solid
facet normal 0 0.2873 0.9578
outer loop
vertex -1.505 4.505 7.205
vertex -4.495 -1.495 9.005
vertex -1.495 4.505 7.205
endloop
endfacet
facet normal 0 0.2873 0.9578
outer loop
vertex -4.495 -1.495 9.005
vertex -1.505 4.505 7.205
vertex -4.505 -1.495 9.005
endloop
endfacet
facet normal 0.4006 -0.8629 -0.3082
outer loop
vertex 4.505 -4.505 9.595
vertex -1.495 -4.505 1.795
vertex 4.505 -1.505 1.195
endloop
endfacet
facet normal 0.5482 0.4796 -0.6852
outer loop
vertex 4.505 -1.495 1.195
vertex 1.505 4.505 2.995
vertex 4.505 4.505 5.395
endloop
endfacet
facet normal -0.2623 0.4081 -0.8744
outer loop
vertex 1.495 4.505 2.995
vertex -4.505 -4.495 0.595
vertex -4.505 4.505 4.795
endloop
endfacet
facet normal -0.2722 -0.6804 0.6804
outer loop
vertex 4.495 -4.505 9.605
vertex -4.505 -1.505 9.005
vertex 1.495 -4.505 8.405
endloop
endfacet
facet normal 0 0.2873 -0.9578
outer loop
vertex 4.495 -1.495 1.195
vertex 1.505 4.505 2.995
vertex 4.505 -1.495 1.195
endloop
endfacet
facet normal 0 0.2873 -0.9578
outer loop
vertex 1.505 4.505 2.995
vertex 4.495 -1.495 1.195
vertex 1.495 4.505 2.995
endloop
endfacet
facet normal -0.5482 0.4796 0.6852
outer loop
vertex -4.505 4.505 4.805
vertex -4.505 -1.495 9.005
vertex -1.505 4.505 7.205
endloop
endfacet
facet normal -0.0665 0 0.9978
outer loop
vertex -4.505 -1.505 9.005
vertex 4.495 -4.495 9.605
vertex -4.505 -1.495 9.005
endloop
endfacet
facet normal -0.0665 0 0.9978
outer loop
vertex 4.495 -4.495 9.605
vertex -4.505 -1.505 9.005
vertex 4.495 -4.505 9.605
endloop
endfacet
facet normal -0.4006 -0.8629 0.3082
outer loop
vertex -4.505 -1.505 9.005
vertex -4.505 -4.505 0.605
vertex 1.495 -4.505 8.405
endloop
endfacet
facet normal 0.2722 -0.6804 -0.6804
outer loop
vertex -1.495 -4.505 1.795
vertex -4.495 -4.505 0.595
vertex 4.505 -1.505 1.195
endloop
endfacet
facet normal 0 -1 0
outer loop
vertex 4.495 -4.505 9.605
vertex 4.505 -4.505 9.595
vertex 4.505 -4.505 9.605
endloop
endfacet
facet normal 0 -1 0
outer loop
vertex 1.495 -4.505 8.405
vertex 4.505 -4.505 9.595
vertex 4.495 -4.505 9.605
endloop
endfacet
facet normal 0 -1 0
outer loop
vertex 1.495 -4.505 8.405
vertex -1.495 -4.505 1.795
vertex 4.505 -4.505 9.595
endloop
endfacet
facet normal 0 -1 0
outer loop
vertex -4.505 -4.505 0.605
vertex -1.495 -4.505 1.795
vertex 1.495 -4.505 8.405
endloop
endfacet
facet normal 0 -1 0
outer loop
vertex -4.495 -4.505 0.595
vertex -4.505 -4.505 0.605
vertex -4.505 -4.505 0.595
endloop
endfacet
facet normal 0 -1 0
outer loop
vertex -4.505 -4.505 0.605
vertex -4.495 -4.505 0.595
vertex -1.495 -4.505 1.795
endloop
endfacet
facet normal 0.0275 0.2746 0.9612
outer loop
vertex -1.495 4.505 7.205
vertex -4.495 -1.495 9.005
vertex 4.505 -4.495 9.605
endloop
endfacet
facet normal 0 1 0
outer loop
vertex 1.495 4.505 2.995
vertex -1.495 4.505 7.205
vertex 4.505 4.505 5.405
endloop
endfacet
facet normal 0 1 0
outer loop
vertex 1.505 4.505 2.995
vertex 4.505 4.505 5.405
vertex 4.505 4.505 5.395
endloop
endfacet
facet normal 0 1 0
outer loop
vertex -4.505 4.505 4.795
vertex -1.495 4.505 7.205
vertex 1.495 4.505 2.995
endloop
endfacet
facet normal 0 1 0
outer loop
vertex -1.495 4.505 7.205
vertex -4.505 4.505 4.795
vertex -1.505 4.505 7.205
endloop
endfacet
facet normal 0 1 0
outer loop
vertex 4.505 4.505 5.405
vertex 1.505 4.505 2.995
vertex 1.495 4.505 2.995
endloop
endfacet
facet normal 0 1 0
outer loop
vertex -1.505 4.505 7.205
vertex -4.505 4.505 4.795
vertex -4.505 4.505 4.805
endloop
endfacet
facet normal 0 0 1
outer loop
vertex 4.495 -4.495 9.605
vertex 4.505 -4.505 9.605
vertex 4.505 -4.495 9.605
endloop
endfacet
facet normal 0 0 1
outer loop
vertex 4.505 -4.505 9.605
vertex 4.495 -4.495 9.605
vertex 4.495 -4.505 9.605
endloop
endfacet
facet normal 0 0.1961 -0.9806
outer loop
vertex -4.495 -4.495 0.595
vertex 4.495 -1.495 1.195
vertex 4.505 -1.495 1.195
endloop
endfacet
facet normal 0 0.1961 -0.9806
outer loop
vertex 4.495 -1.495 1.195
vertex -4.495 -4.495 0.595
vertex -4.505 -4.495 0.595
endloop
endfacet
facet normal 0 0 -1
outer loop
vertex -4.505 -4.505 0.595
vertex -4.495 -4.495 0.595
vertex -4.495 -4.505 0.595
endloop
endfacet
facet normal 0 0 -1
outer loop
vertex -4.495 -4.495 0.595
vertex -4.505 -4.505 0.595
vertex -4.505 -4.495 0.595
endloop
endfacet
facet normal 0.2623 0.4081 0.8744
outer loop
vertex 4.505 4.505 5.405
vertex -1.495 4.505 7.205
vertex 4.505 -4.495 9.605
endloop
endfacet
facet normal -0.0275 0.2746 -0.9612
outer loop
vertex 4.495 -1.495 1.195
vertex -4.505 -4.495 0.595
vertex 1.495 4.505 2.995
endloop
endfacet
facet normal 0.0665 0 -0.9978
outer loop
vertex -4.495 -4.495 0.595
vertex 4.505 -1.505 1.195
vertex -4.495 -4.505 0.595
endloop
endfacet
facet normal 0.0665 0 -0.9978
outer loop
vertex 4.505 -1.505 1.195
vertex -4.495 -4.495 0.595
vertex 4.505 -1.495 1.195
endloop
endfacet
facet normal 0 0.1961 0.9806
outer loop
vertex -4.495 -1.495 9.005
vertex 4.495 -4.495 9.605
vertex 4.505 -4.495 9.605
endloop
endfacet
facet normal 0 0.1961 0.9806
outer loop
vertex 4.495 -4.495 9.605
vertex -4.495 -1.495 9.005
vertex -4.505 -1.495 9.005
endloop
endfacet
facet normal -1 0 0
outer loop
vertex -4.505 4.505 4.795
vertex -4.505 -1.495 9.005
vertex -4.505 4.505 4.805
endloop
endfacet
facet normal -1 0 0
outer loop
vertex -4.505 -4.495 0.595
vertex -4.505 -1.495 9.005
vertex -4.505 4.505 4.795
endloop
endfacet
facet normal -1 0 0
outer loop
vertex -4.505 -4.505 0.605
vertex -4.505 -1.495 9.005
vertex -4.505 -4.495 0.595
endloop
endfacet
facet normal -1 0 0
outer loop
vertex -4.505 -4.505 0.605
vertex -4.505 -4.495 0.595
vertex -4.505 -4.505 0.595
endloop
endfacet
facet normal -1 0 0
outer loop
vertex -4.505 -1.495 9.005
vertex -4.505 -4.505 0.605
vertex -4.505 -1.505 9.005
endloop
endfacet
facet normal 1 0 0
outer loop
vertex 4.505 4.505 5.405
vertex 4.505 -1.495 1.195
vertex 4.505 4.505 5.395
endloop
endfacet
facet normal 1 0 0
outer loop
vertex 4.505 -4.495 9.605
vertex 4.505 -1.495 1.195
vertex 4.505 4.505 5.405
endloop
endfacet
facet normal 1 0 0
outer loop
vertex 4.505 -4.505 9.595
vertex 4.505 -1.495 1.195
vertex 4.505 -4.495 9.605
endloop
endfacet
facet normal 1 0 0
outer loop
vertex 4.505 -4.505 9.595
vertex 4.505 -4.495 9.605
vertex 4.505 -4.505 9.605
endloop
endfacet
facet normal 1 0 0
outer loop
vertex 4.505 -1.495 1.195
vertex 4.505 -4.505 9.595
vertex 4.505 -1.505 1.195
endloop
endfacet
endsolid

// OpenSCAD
// Magic Gem Generator
// Based on the R³ embedding approach described in "Complete Analysis Pipeline for Magic Squares"
// This script converts magic squares into 3D geometric representations

// Define parameters
$fn = 5; // Reduced resolution for faster rendering
point_size = 0.5; // Size of points in the embedding
edge_size = 0.01; // Size of hull vertices
cylinder_size = 0.25; // Size of connecting cylinders
hull_opacity = 0.3; // Opacity of the convex hull faces
show_points = false; // Whether to show the embedded points
show_hull = true; // Whether to show the convex hull
show_edges = false; // Whether to show connecting edges
show_radial_edges = false; // Whether to show radial edges from center to each point
scale_factor = 3; // Scale factor for the embedding
vertical_scale = 0.2; // Vertical scale factor to flatten the shape

// Define magic squares
magic_squares = [
     // 8 vertices, 4 face points, 4 interior points
    [
        [1, 6, 11, 16],
        [14, 12, 5, 3],
        [15, 9, 8, 2],
        [4, 7, 10, 13]
    ],
    // 9 vertices, 3 face points, 4 interior points
    [
        [1, 5, 16, 12],
        [15, 14, 3, 2],
        [10, 11, 6, 7],
        [8, 4, 9, 13]
    ],
    // 10 vertices, 2 face points, 4 interior points
    [
        [1, 3, 14, 16],
        [15, 13, 4, 2],
        [10, 6, 11, 7],
        [8, 12, 5, 9]
    ],
    // // 10 vertices, 3 face points, 3 interior points
    [
        [1, 4, 16, 13],
        [14, 15, 3, 2],
        [11, 10, 6, 7],
        [8, 5, 9, 12]
    ],
    // 10 vertices, 4 face points, 2 interior points
    [
        [1, 4, 13, 16],
        [15, 14, 3, 2],
        [8, 5, 12, 9],
        [10, 11, 6, 7]
    ],
    // 10 vertices, 6 face points, 0 interior points
    [
        [1, 4, 13, 16],
        [8, 14, 3, 9],
        [15, 5, 12, 2],
        [10, 11, 6, 7]
    ],
    // 11 vertices, 1 face points, 4 interior points
    [
        [1, 4, 14, 15],
        [16, 13, 3, 2],
        [11, 10, 8, 5],
        [6, 7, 9, 12]
    ],
    // 11 vertices, 2 face points, 3 interior points
    [
        [1, 4, 14, 15],
        [16, 13, 3, 2],
        [7, 6, 12, 9],
        [10, 11, 5, 8]
    ],
    // 11 vertices, 3 face points, 2 interior points
    [
        [1, 6, 15, 12],
        [16, 11, 2, 5],
        [4, 7, 14, 9],
        [13, 10, 3, 8]
    ],
    // 12 vertices, 0 face points, 4 interior points
    [
        [1, 3, 14, 16],
        [10, 13, 4, 7],
        [15, 6, 11, 2],
        [8, 12, 5, 9]
    ],
    // 12 vertices, 1 face points, 3 interior points
    [
        [1, 2, 16, 15],
        [13, 14, 4, 3],
        [12, 7, 9, 6],
        [8, 11, 5, 10]
    ],
    // 12 vertices, 2 face points, 2 interior points
    [
        [1, 2, 15, 16],
        [12, 14, 3, 5],
        [13, 7, 10, 4],
        [8, 11, 6, 9]
    ],
    // 12 vertices, 4 face points, 0 interior points
    [
        [1, 6, 11, 16],
        [7, 15, 2, 10],
        [14, 4, 13, 3],
        [12, 9, 8, 5]
    ],
    // 13 vertices, 0 face points, 3 interior points
    [
        [1, 10, 16, 7],
        [15, 8, 2, 9],
        [4, 11, 13, 6],
        [14, 5, 3, 12]
    ],
    // 13 vertices, 1 face points, 2 interior points
    [
        [1, 3, 16, 14],
        [12, 15, 2, 5],
        [13, 10, 7, 4],
        [8, 6, 9, 11]
    ],
    // 13 vertices, 2 face points, 1 interior points
    [
        [1, 5, 16, 12],
        [8, 14, 3, 9],
        [10, 4, 13, 7],
        [15, 11, 2, 6]
    ],
    // 14 vertices, 0 face points, 2 interior points
    [
        [1, 2, 15, 16],
        [13, 14, 3, 4],
        [12, 7, 10, 5],
        [8, 11, 6, 9]
    ],
    // 14 vertices, 1 face points, 1 interior points
    [
        [5, 2, 16, 11],
        [12, 15, 1, 6],
        [9, 14, 4, 7],
        [8, 3, 13, 10]
    ],
    // 14 vertices, 2 face points, 0 interior points
    [
        [1, 4, 13, 16],
        [14, 15, 2, 3],
        [8, 5, 12, 9],
        [11, 10, 7, 6]
    ],
    // 15 vertices, 0 face points, 1 interior points
    [
        [1, 4, 14, 15],
        [13, 16, 2, 3],
        [8, 5, 11, 10],
        [12, 9, 7, 6]
    ],
    // 16 vertices, 0 face points, 0 interior points
    [
        [1, 4, 13, 16],
        [8, 15, 2, 9],
        [14, 5, 12, 3],
        [11, 10, 7, 6]
    ]
];

// Function to convert 1D index to 3D coordinates (i, j, value)
function index_to_coords(idx, square) = 
    let(
        i = floor(idx / 4),
        j = idx % 4,
        value = square[i][j]
    )
    // Center the square in XY plane and scale Z independently
    [
        (j - 1.5) * scale_factor,  // Center X
        (i - 1.5) * scale_factor,  // Center Y
        value * scale_factor * vertical_scale  // Scale Z
    ];

// Function to get all point coordinates for a square
function get_all_points(square) = 
    [for (i = [0:15]) index_to_coords(i, square)];

// Function to calculate the centroid of a set of points
function centroid(points) =
    let(
        sum_x = sum([for (p = points) p[0]]),
        sum_y = sum([for (p = points) p[1]]),
        sum_z = sum([for (p = points) p[2]]),
        n = len(points)
    )
    [sum_x/n, sum_y/n, sum_z/n];

// Function to sum a list of values
function sum(list) = 
    [for(i = list) 1] * list;

// Module to create a cylinder between two points
module connect_points(p1, p2) {
    // Calculate the vector between points
    v = p2 - p1;
    // Calculate length and rotation
    h = norm(v);
    if (h > 0) {  // Only create cylinder if points are different
        // Create the cylinder
        translate(p1)
            rotate([0, 
                    acos(v.z/h), // Rotation around Y
                    atan2(v.y, v.x)  // Rotation around Z
                   ])
                cylinder(h=h, d=cylinder_size, center=false);
    }
}

// Module to create all possible connections between points
module create_all_connections(points) {
    // Connect every point with every other point
    for (i = [0:len(points)-1]) {
        for (j = [i+1:len(points)-1]) {
            connect_points(points[i], points[j]);
        }
    }
}

// Function to determine if a point is on the convex hull
function is_hull_point(point, points) =
    let(
        eps = 1.5,
        others = [for(p = points) if(p != point) p],
        center = centroid(others)
    )
    norm(point - center) >= max([for(p = others) norm(p - center)]) - eps;

// Function to get hull points
function get_hull_points(points) =
    [for(p = points) if(is_hull_point(p, points)) p];

// Module to create hull edge connections
module create_hull_edges(points) {
    hull_points = get_hull_points(points);
    
    // Connect each hull point to its nearest neighbors
    for (i = [0:len(hull_points)-1]) {
        for (j = [i+1:len(hull_points)-1]) {
            // Only connect if they form a hull edge
            if (norm(hull_points[i] - hull_points[j]) <= scale_factor * 4.5) {
                connect_points(hull_points[i], hull_points[j]);
            }
        }
    }
}

// Module to create radial connections from center to each point
module create_radial_connections(points) {
    // Calculate the centroid
    center = centroid(points);
    
    // Connect center to each point
    for (i = [0:len(points)-1]) {
        connect_points(center, points[i]);
    }
    
    // // Add hull edges in the same color as radial edges
    // create_hull_edges(points);
    
    // Show the center point
    color([0, 0.5, 1])
        translate(center)
            sphere(d=cylinder_size*2);
}

// Module to create a magic square gem
module magic_square_gem(square) {
    points = get_all_points(square);
    
    difference() {
        union() {
            // Create the convex hull using hidden cubes
            if (show_hull) {
                // Create hull faces with transparency
                color([0.8, 0.8, 0.8, hull_opacity])
                    hull() {
                        for (p = points) {
                            translate(p)
                                cube([edge_size, edge_size, edge_size], center=true);
                        }
                    }
            }
            
            // Show connecting edges if enabled
            if (show_edges) {
                color([0.5, 0.5, 0.5, 0.8])
                    create_all_connections(points);
            }
            
            // Show radial edges if enabled
            if (show_radial_edges) {
                color([0.3, 0.7, 0.9, 0.8])
                    create_radial_connections(points);
            }
            
            // Show points as spheres if enabled
            if (show_points) {
                for (p = points) {
                    color([1, 0, 0])
                        translate(p)
                            sphere(d=point_size);
                }
            }
        }
        
        // Cut off bottom to make it sit flat
        translate([-50, -50, -50])
            cube([100, 100, 50]);
    }
}

// Display the selected magic square
magic_square_gem(magic_squares[2]); 
